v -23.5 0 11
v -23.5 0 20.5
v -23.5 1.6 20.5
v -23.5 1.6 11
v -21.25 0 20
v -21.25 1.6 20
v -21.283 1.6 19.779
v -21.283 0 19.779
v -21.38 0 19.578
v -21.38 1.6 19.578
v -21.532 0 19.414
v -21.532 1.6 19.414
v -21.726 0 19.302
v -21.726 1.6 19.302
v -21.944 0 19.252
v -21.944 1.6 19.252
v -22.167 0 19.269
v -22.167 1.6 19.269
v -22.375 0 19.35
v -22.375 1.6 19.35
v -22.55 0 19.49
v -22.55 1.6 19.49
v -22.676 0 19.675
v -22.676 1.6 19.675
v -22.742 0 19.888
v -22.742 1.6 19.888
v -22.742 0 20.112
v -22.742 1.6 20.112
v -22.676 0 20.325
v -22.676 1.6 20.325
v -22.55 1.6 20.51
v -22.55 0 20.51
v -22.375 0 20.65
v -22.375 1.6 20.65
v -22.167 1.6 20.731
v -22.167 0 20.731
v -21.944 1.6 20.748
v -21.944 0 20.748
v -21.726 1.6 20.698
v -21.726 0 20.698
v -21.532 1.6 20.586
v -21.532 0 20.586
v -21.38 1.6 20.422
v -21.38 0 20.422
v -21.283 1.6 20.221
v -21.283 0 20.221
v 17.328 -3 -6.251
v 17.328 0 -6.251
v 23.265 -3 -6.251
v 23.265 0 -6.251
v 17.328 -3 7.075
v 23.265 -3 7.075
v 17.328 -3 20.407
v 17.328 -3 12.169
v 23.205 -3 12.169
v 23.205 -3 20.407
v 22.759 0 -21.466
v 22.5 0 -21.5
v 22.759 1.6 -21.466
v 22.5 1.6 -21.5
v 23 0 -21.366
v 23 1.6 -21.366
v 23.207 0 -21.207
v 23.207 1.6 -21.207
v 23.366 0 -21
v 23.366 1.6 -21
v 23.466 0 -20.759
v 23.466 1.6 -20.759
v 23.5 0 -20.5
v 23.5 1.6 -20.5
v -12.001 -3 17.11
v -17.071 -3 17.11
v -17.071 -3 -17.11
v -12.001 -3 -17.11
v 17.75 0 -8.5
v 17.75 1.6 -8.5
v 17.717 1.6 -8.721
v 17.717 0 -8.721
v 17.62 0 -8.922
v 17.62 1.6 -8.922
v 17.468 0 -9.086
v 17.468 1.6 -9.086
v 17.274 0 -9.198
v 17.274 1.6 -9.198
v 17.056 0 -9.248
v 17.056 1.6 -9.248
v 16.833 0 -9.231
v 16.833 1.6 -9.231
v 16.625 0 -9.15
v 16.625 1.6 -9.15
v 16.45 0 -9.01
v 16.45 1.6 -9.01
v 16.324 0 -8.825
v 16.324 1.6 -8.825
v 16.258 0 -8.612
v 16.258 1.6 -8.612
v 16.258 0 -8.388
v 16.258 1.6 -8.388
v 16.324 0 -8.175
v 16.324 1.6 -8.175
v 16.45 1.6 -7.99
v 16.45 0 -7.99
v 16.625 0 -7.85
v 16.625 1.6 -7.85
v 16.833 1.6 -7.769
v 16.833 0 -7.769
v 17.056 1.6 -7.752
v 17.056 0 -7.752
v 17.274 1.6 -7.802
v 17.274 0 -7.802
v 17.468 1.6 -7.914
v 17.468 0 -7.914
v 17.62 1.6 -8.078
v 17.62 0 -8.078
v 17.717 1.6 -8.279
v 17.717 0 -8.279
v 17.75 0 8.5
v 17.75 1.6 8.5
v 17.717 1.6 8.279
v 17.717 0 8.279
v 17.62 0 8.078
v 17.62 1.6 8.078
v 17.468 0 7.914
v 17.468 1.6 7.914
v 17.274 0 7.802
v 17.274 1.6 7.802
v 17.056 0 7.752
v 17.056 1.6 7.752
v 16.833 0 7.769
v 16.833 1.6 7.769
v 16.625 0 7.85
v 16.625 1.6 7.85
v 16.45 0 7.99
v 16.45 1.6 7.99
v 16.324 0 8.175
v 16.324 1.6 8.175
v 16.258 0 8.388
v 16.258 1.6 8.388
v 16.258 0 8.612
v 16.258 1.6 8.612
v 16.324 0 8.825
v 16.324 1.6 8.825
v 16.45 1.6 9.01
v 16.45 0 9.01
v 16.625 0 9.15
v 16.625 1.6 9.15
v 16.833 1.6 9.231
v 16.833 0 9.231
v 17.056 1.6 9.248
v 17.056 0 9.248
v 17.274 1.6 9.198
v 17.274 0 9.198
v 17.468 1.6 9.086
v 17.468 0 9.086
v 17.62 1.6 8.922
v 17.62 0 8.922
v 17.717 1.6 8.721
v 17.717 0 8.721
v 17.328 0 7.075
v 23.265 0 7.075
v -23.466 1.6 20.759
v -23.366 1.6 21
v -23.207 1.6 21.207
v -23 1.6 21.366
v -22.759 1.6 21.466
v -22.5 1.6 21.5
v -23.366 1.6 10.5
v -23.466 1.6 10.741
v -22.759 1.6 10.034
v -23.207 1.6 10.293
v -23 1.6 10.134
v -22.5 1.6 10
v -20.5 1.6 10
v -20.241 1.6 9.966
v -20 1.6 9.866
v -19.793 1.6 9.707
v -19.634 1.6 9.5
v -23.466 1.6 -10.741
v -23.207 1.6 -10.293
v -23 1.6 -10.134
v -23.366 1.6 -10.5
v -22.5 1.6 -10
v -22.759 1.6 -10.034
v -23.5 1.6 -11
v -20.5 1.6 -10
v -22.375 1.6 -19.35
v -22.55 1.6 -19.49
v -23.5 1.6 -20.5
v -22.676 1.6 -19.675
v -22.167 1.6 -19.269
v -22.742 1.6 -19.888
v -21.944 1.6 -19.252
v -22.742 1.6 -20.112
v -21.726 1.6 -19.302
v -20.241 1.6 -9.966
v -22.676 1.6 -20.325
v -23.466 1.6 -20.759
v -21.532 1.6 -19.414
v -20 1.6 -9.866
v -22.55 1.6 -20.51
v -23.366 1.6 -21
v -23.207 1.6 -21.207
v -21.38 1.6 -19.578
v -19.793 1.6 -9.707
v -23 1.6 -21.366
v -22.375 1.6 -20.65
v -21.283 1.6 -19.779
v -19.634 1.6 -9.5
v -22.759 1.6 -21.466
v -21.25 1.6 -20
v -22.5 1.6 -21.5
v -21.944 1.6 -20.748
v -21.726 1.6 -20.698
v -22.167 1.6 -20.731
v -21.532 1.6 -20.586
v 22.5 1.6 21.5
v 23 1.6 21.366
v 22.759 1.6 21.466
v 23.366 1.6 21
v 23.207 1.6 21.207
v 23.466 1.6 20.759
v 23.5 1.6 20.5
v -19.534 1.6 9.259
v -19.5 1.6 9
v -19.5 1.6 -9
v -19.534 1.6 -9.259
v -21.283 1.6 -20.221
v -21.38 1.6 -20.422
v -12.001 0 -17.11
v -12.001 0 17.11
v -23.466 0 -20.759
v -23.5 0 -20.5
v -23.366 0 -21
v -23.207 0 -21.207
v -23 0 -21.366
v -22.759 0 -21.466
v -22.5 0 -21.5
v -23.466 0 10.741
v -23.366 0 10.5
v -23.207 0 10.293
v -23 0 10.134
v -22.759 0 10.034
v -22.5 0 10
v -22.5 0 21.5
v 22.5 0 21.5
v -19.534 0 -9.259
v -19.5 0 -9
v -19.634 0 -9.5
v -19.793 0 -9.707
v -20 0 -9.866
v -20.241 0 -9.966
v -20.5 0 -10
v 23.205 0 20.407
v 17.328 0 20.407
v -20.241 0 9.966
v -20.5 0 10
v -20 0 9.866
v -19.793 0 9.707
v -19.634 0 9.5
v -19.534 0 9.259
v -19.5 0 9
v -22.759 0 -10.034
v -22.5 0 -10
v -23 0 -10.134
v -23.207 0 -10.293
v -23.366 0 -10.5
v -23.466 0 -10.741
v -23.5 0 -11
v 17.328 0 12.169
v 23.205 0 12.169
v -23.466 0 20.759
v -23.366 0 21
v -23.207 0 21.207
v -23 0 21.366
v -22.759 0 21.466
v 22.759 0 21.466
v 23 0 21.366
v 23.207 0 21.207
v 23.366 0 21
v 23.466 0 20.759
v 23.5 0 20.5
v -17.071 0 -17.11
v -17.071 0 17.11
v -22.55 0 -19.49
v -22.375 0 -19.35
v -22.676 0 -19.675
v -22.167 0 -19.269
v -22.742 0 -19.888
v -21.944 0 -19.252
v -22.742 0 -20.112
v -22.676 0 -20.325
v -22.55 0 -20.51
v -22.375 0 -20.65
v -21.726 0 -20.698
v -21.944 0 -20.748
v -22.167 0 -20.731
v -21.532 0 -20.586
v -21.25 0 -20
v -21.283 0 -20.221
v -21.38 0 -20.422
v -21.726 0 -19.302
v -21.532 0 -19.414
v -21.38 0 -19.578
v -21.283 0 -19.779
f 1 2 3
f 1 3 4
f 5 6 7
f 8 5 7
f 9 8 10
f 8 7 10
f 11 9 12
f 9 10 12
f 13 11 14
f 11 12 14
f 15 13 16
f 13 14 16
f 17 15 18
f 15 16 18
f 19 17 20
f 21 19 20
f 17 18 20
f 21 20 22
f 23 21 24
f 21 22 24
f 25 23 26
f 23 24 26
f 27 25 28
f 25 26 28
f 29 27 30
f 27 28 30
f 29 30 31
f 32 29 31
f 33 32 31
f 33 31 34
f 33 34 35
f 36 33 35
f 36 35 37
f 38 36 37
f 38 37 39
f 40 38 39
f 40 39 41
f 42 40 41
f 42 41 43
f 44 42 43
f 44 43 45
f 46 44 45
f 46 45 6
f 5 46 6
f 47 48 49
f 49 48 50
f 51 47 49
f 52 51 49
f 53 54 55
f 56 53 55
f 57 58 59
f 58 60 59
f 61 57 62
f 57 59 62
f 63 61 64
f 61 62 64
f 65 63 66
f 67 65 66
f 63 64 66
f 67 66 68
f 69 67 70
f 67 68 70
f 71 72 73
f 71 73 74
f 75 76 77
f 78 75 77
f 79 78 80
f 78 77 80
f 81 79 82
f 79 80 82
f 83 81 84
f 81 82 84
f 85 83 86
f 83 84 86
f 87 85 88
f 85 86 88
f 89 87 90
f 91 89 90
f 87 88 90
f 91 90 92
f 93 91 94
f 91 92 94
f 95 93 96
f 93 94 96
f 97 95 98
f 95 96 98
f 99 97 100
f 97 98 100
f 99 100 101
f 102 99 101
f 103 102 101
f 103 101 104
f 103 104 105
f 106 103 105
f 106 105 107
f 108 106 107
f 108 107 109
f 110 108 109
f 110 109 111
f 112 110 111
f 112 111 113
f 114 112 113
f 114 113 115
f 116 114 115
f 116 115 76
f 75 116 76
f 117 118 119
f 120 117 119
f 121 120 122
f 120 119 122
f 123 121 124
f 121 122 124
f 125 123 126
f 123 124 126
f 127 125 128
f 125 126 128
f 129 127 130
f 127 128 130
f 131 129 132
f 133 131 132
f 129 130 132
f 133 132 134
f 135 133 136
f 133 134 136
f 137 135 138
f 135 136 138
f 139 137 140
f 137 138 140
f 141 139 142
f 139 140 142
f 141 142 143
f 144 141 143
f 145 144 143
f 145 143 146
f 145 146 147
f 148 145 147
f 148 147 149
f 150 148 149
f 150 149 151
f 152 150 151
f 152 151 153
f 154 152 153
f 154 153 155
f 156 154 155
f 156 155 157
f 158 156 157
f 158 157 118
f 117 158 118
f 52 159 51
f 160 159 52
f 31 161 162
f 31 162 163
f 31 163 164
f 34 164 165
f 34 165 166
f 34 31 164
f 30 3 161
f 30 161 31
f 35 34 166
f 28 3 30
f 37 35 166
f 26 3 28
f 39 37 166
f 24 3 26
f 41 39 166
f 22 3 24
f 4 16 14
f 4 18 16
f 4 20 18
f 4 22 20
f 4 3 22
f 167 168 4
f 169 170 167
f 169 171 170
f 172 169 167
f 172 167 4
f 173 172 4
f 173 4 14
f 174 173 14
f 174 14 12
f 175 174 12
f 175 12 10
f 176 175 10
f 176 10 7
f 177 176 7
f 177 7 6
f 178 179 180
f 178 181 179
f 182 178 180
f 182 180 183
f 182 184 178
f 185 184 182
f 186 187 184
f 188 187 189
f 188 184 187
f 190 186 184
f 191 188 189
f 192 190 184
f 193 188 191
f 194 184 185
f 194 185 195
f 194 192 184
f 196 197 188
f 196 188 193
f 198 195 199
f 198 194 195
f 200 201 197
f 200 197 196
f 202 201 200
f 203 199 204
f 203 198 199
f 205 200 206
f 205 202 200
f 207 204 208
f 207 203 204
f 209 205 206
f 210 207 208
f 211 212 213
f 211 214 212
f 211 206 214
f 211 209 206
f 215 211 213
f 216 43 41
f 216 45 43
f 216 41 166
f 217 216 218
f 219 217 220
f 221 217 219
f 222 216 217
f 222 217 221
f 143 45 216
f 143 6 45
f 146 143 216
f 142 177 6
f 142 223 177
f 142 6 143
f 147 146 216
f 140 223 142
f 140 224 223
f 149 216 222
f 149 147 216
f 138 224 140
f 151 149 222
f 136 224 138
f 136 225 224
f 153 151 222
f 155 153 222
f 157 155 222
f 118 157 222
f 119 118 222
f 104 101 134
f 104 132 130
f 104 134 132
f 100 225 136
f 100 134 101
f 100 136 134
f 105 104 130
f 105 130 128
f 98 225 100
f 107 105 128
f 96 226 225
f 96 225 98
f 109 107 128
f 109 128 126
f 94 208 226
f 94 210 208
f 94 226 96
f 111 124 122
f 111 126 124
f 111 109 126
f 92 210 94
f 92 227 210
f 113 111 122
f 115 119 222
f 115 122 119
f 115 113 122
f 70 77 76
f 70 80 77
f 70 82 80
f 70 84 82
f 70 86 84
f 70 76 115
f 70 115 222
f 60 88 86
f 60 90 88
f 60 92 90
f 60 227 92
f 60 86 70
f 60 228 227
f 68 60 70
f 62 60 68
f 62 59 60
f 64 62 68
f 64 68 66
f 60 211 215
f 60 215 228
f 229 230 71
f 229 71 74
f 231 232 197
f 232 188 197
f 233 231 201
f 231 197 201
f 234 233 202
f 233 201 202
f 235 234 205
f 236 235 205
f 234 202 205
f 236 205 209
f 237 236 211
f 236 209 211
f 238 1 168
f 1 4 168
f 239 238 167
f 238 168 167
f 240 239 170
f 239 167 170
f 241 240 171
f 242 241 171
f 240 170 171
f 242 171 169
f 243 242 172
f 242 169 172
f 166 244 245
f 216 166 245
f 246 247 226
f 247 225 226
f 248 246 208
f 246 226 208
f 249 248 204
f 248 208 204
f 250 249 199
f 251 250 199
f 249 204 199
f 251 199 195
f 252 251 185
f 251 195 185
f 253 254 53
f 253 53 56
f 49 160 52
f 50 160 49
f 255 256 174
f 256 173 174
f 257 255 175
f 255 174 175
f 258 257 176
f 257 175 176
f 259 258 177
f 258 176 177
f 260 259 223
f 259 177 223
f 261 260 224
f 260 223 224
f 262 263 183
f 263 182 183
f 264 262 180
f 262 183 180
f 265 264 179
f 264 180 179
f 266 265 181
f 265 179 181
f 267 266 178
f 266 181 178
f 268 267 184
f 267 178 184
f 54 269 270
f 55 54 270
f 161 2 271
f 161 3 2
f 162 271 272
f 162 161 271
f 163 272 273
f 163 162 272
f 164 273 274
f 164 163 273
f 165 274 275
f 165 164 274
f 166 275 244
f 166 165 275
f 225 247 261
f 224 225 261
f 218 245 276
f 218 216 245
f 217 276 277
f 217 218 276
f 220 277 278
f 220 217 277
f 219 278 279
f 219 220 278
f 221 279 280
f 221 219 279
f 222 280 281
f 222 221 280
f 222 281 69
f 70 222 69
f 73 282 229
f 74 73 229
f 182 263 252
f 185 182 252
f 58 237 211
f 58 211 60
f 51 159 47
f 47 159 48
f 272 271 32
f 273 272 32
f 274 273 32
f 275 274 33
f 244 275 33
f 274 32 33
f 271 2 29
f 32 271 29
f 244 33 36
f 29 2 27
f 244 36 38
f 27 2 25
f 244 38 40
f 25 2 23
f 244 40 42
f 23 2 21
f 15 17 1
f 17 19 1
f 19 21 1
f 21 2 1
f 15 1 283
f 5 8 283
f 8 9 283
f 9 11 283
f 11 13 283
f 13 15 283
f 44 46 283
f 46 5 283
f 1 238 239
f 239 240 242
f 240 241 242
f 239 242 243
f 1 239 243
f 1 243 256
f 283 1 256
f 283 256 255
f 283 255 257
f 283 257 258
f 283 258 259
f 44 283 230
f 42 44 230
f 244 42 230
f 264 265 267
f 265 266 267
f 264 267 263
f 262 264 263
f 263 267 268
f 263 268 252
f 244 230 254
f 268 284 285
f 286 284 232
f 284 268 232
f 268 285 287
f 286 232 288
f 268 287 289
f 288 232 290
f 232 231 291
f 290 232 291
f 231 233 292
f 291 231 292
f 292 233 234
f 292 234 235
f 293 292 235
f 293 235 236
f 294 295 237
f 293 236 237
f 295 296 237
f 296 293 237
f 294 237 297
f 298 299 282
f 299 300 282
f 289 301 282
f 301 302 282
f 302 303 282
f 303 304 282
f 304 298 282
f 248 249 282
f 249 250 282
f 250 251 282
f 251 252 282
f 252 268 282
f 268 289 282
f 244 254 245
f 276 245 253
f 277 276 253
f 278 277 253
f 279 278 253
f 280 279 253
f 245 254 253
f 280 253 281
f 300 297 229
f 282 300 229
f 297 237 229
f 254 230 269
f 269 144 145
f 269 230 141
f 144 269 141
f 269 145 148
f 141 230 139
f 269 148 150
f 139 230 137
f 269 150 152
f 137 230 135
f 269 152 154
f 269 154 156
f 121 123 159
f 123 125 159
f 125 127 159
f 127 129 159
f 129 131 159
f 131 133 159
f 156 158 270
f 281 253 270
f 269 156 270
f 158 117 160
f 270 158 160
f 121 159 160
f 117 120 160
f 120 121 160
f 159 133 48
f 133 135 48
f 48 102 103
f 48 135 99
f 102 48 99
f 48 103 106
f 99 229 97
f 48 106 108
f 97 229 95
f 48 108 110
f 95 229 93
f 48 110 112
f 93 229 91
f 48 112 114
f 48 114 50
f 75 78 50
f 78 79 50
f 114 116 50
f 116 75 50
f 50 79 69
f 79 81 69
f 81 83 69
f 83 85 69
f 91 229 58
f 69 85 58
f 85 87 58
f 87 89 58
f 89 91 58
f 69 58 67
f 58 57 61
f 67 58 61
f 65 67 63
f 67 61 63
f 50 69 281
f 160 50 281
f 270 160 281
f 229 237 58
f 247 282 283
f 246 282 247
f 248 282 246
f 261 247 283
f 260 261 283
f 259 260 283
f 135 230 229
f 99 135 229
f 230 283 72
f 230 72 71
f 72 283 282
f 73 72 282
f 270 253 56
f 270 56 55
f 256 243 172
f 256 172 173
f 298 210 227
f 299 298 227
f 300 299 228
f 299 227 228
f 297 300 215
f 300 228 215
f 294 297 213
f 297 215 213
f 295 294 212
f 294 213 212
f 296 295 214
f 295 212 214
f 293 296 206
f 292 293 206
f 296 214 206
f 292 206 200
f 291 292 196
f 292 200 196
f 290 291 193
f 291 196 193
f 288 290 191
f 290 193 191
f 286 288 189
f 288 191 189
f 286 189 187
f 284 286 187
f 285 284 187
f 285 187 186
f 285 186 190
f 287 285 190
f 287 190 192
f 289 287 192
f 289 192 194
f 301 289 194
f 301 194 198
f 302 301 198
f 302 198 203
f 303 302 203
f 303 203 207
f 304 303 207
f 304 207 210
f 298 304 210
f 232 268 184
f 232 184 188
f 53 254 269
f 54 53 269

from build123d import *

# Parameters (mm, degrees)
SKETCH_1_W          = 47
SKETCH_1_H          = 43
EXTRUDE_1_DEPTH     = 1.6
SKETCH_2_R          = 0.75
CUT_EXTRUDE_1_DEPTH = 2.6
SKETCH_3_R          = 0.75
CUT_EXTRUDE_2_DEPTH = 2.6
FILLET_1_R          = 1
SKETCH_4_W          = 4
SKETCH_4_H          = 20
CUT_EXTRUDE_3_DEPTH = 2.6
FILLET_2_R          = 1
FILLET_3_R          = 1
SKETCH_5_W          = 5.069767946
SKETCH_5_H          = 34.220933634
SKETCH_5_W_2        = 5.937201646
SKETCH_5_H_2        = 13.326189681
SKETCH_5_W_3        = 5.876807137
SKETCH_5_H_3        = 8.238372911
EXTRUDE_2_DEPTH     = 3


with BuildPart() as part:
    # 草图1 → 凸台-拉伸1 (new body)
    with BuildSketch(Plane(origin=(0, 0, 0), x_dir=(1, 0, 0), z_dir=(0, 1, 0))):
        Rectangle(SKETCH_1_W, SKETCH_1_H)
    extrude(amount=EXTRUDE_1_DEPTH)

    # 草图2 → 切除-拉伸1 (cut, through all)
    with BuildSketch(Plane(origin=(0, 1.6, 0), x_dir=(1, 0, 0), z_dir=(0, 1, 0))):
        with Locations((-22, 20)):
            Circle(SKETCH_2_R)
        with Locations((-22, -20)):
            Circle(SKETCH_2_R)
    extrude(amount=-CUT_EXTRUDE_1_DEPTH, mode=Mode.SUBTRACT)

    # 草图3 → 切除-拉伸2 (cut, through all)
    with BuildSketch(Plane(origin=(0, 1.6, 0), x_dir=(1, 0, 0), z_dir=(0, 1, 0))):
        with Locations((17, 8.5)):
            Circle(SKETCH_3_R)
        with Locations((17, -8.5)):
            Circle(SKETCH_3_R)
    extrude(amount=-CUT_EXTRUDE_2_DEPTH, mode=Mode.SUBTRACT)

    # 圆角1
    fillet_1_edges = [part.edges().sort_by_distance(p)[0] for p in [
        (-23.5, 0.8, -21.5),
        (23.5, 0.8, -21.5),
        (23.5, 0.8, 21.5),
        (-23.5, 0.8, 21.5),
    ]]
    fillet(fillet_1_edges, radius=FILLET_1_R)

    # 草图4 → 切除-拉伸3 (cut, through all)
    with BuildSketch(Plane.XZ):
        with Locations((-21.5, 0)):
            Rectangle(SKETCH_4_W, SKETCH_4_H)
    extrude(amount=-CUT_EXTRUDE_3_DEPTH, mode=Mode.SUBTRACT)

    # 圆角2
    fillet_2_edges = [part.edges().sort_by_distance(p)[0] for p in [
        (-23.5, 0.8, -10),
        (-23.5, 0.8, 10),
    ]]
    fillet(fillet_2_edges, radius=FILLET_2_R)

    # 圆角3
    fillet_3_edges = [part.edges().sort_by_distance(p)[0] for p in [
        (-19.5, 0.8, 10),
        (-19.5, 0.8, -10),
    ]]
    fillet(fillet_3_edges, radius=FILLET_3_R)

    # 草图5 → 凸台-拉伸2 (add)
    with BuildSketch(Plane(origin=(0, 0, 0), x_dir=(1, 0, 0), z_dir=(0, 1, 0))):
        with Locations((-14.535975282, 0)):
            Rectangle(SKETCH_5_W, SKETCH_5_H)
        with Locations((20.296771565, -0.412263102)):
            Rectangle(SKETCH_5_W_2, SKETCH_5_H_2)
        with Locations((20.266574311, -16.287696964)):
            Rectangle(SKETCH_5_W_3, SKETCH_5_H_3)
    extrude(amount=-EXTRUDE_2_DEPTH)


solid = part.part
